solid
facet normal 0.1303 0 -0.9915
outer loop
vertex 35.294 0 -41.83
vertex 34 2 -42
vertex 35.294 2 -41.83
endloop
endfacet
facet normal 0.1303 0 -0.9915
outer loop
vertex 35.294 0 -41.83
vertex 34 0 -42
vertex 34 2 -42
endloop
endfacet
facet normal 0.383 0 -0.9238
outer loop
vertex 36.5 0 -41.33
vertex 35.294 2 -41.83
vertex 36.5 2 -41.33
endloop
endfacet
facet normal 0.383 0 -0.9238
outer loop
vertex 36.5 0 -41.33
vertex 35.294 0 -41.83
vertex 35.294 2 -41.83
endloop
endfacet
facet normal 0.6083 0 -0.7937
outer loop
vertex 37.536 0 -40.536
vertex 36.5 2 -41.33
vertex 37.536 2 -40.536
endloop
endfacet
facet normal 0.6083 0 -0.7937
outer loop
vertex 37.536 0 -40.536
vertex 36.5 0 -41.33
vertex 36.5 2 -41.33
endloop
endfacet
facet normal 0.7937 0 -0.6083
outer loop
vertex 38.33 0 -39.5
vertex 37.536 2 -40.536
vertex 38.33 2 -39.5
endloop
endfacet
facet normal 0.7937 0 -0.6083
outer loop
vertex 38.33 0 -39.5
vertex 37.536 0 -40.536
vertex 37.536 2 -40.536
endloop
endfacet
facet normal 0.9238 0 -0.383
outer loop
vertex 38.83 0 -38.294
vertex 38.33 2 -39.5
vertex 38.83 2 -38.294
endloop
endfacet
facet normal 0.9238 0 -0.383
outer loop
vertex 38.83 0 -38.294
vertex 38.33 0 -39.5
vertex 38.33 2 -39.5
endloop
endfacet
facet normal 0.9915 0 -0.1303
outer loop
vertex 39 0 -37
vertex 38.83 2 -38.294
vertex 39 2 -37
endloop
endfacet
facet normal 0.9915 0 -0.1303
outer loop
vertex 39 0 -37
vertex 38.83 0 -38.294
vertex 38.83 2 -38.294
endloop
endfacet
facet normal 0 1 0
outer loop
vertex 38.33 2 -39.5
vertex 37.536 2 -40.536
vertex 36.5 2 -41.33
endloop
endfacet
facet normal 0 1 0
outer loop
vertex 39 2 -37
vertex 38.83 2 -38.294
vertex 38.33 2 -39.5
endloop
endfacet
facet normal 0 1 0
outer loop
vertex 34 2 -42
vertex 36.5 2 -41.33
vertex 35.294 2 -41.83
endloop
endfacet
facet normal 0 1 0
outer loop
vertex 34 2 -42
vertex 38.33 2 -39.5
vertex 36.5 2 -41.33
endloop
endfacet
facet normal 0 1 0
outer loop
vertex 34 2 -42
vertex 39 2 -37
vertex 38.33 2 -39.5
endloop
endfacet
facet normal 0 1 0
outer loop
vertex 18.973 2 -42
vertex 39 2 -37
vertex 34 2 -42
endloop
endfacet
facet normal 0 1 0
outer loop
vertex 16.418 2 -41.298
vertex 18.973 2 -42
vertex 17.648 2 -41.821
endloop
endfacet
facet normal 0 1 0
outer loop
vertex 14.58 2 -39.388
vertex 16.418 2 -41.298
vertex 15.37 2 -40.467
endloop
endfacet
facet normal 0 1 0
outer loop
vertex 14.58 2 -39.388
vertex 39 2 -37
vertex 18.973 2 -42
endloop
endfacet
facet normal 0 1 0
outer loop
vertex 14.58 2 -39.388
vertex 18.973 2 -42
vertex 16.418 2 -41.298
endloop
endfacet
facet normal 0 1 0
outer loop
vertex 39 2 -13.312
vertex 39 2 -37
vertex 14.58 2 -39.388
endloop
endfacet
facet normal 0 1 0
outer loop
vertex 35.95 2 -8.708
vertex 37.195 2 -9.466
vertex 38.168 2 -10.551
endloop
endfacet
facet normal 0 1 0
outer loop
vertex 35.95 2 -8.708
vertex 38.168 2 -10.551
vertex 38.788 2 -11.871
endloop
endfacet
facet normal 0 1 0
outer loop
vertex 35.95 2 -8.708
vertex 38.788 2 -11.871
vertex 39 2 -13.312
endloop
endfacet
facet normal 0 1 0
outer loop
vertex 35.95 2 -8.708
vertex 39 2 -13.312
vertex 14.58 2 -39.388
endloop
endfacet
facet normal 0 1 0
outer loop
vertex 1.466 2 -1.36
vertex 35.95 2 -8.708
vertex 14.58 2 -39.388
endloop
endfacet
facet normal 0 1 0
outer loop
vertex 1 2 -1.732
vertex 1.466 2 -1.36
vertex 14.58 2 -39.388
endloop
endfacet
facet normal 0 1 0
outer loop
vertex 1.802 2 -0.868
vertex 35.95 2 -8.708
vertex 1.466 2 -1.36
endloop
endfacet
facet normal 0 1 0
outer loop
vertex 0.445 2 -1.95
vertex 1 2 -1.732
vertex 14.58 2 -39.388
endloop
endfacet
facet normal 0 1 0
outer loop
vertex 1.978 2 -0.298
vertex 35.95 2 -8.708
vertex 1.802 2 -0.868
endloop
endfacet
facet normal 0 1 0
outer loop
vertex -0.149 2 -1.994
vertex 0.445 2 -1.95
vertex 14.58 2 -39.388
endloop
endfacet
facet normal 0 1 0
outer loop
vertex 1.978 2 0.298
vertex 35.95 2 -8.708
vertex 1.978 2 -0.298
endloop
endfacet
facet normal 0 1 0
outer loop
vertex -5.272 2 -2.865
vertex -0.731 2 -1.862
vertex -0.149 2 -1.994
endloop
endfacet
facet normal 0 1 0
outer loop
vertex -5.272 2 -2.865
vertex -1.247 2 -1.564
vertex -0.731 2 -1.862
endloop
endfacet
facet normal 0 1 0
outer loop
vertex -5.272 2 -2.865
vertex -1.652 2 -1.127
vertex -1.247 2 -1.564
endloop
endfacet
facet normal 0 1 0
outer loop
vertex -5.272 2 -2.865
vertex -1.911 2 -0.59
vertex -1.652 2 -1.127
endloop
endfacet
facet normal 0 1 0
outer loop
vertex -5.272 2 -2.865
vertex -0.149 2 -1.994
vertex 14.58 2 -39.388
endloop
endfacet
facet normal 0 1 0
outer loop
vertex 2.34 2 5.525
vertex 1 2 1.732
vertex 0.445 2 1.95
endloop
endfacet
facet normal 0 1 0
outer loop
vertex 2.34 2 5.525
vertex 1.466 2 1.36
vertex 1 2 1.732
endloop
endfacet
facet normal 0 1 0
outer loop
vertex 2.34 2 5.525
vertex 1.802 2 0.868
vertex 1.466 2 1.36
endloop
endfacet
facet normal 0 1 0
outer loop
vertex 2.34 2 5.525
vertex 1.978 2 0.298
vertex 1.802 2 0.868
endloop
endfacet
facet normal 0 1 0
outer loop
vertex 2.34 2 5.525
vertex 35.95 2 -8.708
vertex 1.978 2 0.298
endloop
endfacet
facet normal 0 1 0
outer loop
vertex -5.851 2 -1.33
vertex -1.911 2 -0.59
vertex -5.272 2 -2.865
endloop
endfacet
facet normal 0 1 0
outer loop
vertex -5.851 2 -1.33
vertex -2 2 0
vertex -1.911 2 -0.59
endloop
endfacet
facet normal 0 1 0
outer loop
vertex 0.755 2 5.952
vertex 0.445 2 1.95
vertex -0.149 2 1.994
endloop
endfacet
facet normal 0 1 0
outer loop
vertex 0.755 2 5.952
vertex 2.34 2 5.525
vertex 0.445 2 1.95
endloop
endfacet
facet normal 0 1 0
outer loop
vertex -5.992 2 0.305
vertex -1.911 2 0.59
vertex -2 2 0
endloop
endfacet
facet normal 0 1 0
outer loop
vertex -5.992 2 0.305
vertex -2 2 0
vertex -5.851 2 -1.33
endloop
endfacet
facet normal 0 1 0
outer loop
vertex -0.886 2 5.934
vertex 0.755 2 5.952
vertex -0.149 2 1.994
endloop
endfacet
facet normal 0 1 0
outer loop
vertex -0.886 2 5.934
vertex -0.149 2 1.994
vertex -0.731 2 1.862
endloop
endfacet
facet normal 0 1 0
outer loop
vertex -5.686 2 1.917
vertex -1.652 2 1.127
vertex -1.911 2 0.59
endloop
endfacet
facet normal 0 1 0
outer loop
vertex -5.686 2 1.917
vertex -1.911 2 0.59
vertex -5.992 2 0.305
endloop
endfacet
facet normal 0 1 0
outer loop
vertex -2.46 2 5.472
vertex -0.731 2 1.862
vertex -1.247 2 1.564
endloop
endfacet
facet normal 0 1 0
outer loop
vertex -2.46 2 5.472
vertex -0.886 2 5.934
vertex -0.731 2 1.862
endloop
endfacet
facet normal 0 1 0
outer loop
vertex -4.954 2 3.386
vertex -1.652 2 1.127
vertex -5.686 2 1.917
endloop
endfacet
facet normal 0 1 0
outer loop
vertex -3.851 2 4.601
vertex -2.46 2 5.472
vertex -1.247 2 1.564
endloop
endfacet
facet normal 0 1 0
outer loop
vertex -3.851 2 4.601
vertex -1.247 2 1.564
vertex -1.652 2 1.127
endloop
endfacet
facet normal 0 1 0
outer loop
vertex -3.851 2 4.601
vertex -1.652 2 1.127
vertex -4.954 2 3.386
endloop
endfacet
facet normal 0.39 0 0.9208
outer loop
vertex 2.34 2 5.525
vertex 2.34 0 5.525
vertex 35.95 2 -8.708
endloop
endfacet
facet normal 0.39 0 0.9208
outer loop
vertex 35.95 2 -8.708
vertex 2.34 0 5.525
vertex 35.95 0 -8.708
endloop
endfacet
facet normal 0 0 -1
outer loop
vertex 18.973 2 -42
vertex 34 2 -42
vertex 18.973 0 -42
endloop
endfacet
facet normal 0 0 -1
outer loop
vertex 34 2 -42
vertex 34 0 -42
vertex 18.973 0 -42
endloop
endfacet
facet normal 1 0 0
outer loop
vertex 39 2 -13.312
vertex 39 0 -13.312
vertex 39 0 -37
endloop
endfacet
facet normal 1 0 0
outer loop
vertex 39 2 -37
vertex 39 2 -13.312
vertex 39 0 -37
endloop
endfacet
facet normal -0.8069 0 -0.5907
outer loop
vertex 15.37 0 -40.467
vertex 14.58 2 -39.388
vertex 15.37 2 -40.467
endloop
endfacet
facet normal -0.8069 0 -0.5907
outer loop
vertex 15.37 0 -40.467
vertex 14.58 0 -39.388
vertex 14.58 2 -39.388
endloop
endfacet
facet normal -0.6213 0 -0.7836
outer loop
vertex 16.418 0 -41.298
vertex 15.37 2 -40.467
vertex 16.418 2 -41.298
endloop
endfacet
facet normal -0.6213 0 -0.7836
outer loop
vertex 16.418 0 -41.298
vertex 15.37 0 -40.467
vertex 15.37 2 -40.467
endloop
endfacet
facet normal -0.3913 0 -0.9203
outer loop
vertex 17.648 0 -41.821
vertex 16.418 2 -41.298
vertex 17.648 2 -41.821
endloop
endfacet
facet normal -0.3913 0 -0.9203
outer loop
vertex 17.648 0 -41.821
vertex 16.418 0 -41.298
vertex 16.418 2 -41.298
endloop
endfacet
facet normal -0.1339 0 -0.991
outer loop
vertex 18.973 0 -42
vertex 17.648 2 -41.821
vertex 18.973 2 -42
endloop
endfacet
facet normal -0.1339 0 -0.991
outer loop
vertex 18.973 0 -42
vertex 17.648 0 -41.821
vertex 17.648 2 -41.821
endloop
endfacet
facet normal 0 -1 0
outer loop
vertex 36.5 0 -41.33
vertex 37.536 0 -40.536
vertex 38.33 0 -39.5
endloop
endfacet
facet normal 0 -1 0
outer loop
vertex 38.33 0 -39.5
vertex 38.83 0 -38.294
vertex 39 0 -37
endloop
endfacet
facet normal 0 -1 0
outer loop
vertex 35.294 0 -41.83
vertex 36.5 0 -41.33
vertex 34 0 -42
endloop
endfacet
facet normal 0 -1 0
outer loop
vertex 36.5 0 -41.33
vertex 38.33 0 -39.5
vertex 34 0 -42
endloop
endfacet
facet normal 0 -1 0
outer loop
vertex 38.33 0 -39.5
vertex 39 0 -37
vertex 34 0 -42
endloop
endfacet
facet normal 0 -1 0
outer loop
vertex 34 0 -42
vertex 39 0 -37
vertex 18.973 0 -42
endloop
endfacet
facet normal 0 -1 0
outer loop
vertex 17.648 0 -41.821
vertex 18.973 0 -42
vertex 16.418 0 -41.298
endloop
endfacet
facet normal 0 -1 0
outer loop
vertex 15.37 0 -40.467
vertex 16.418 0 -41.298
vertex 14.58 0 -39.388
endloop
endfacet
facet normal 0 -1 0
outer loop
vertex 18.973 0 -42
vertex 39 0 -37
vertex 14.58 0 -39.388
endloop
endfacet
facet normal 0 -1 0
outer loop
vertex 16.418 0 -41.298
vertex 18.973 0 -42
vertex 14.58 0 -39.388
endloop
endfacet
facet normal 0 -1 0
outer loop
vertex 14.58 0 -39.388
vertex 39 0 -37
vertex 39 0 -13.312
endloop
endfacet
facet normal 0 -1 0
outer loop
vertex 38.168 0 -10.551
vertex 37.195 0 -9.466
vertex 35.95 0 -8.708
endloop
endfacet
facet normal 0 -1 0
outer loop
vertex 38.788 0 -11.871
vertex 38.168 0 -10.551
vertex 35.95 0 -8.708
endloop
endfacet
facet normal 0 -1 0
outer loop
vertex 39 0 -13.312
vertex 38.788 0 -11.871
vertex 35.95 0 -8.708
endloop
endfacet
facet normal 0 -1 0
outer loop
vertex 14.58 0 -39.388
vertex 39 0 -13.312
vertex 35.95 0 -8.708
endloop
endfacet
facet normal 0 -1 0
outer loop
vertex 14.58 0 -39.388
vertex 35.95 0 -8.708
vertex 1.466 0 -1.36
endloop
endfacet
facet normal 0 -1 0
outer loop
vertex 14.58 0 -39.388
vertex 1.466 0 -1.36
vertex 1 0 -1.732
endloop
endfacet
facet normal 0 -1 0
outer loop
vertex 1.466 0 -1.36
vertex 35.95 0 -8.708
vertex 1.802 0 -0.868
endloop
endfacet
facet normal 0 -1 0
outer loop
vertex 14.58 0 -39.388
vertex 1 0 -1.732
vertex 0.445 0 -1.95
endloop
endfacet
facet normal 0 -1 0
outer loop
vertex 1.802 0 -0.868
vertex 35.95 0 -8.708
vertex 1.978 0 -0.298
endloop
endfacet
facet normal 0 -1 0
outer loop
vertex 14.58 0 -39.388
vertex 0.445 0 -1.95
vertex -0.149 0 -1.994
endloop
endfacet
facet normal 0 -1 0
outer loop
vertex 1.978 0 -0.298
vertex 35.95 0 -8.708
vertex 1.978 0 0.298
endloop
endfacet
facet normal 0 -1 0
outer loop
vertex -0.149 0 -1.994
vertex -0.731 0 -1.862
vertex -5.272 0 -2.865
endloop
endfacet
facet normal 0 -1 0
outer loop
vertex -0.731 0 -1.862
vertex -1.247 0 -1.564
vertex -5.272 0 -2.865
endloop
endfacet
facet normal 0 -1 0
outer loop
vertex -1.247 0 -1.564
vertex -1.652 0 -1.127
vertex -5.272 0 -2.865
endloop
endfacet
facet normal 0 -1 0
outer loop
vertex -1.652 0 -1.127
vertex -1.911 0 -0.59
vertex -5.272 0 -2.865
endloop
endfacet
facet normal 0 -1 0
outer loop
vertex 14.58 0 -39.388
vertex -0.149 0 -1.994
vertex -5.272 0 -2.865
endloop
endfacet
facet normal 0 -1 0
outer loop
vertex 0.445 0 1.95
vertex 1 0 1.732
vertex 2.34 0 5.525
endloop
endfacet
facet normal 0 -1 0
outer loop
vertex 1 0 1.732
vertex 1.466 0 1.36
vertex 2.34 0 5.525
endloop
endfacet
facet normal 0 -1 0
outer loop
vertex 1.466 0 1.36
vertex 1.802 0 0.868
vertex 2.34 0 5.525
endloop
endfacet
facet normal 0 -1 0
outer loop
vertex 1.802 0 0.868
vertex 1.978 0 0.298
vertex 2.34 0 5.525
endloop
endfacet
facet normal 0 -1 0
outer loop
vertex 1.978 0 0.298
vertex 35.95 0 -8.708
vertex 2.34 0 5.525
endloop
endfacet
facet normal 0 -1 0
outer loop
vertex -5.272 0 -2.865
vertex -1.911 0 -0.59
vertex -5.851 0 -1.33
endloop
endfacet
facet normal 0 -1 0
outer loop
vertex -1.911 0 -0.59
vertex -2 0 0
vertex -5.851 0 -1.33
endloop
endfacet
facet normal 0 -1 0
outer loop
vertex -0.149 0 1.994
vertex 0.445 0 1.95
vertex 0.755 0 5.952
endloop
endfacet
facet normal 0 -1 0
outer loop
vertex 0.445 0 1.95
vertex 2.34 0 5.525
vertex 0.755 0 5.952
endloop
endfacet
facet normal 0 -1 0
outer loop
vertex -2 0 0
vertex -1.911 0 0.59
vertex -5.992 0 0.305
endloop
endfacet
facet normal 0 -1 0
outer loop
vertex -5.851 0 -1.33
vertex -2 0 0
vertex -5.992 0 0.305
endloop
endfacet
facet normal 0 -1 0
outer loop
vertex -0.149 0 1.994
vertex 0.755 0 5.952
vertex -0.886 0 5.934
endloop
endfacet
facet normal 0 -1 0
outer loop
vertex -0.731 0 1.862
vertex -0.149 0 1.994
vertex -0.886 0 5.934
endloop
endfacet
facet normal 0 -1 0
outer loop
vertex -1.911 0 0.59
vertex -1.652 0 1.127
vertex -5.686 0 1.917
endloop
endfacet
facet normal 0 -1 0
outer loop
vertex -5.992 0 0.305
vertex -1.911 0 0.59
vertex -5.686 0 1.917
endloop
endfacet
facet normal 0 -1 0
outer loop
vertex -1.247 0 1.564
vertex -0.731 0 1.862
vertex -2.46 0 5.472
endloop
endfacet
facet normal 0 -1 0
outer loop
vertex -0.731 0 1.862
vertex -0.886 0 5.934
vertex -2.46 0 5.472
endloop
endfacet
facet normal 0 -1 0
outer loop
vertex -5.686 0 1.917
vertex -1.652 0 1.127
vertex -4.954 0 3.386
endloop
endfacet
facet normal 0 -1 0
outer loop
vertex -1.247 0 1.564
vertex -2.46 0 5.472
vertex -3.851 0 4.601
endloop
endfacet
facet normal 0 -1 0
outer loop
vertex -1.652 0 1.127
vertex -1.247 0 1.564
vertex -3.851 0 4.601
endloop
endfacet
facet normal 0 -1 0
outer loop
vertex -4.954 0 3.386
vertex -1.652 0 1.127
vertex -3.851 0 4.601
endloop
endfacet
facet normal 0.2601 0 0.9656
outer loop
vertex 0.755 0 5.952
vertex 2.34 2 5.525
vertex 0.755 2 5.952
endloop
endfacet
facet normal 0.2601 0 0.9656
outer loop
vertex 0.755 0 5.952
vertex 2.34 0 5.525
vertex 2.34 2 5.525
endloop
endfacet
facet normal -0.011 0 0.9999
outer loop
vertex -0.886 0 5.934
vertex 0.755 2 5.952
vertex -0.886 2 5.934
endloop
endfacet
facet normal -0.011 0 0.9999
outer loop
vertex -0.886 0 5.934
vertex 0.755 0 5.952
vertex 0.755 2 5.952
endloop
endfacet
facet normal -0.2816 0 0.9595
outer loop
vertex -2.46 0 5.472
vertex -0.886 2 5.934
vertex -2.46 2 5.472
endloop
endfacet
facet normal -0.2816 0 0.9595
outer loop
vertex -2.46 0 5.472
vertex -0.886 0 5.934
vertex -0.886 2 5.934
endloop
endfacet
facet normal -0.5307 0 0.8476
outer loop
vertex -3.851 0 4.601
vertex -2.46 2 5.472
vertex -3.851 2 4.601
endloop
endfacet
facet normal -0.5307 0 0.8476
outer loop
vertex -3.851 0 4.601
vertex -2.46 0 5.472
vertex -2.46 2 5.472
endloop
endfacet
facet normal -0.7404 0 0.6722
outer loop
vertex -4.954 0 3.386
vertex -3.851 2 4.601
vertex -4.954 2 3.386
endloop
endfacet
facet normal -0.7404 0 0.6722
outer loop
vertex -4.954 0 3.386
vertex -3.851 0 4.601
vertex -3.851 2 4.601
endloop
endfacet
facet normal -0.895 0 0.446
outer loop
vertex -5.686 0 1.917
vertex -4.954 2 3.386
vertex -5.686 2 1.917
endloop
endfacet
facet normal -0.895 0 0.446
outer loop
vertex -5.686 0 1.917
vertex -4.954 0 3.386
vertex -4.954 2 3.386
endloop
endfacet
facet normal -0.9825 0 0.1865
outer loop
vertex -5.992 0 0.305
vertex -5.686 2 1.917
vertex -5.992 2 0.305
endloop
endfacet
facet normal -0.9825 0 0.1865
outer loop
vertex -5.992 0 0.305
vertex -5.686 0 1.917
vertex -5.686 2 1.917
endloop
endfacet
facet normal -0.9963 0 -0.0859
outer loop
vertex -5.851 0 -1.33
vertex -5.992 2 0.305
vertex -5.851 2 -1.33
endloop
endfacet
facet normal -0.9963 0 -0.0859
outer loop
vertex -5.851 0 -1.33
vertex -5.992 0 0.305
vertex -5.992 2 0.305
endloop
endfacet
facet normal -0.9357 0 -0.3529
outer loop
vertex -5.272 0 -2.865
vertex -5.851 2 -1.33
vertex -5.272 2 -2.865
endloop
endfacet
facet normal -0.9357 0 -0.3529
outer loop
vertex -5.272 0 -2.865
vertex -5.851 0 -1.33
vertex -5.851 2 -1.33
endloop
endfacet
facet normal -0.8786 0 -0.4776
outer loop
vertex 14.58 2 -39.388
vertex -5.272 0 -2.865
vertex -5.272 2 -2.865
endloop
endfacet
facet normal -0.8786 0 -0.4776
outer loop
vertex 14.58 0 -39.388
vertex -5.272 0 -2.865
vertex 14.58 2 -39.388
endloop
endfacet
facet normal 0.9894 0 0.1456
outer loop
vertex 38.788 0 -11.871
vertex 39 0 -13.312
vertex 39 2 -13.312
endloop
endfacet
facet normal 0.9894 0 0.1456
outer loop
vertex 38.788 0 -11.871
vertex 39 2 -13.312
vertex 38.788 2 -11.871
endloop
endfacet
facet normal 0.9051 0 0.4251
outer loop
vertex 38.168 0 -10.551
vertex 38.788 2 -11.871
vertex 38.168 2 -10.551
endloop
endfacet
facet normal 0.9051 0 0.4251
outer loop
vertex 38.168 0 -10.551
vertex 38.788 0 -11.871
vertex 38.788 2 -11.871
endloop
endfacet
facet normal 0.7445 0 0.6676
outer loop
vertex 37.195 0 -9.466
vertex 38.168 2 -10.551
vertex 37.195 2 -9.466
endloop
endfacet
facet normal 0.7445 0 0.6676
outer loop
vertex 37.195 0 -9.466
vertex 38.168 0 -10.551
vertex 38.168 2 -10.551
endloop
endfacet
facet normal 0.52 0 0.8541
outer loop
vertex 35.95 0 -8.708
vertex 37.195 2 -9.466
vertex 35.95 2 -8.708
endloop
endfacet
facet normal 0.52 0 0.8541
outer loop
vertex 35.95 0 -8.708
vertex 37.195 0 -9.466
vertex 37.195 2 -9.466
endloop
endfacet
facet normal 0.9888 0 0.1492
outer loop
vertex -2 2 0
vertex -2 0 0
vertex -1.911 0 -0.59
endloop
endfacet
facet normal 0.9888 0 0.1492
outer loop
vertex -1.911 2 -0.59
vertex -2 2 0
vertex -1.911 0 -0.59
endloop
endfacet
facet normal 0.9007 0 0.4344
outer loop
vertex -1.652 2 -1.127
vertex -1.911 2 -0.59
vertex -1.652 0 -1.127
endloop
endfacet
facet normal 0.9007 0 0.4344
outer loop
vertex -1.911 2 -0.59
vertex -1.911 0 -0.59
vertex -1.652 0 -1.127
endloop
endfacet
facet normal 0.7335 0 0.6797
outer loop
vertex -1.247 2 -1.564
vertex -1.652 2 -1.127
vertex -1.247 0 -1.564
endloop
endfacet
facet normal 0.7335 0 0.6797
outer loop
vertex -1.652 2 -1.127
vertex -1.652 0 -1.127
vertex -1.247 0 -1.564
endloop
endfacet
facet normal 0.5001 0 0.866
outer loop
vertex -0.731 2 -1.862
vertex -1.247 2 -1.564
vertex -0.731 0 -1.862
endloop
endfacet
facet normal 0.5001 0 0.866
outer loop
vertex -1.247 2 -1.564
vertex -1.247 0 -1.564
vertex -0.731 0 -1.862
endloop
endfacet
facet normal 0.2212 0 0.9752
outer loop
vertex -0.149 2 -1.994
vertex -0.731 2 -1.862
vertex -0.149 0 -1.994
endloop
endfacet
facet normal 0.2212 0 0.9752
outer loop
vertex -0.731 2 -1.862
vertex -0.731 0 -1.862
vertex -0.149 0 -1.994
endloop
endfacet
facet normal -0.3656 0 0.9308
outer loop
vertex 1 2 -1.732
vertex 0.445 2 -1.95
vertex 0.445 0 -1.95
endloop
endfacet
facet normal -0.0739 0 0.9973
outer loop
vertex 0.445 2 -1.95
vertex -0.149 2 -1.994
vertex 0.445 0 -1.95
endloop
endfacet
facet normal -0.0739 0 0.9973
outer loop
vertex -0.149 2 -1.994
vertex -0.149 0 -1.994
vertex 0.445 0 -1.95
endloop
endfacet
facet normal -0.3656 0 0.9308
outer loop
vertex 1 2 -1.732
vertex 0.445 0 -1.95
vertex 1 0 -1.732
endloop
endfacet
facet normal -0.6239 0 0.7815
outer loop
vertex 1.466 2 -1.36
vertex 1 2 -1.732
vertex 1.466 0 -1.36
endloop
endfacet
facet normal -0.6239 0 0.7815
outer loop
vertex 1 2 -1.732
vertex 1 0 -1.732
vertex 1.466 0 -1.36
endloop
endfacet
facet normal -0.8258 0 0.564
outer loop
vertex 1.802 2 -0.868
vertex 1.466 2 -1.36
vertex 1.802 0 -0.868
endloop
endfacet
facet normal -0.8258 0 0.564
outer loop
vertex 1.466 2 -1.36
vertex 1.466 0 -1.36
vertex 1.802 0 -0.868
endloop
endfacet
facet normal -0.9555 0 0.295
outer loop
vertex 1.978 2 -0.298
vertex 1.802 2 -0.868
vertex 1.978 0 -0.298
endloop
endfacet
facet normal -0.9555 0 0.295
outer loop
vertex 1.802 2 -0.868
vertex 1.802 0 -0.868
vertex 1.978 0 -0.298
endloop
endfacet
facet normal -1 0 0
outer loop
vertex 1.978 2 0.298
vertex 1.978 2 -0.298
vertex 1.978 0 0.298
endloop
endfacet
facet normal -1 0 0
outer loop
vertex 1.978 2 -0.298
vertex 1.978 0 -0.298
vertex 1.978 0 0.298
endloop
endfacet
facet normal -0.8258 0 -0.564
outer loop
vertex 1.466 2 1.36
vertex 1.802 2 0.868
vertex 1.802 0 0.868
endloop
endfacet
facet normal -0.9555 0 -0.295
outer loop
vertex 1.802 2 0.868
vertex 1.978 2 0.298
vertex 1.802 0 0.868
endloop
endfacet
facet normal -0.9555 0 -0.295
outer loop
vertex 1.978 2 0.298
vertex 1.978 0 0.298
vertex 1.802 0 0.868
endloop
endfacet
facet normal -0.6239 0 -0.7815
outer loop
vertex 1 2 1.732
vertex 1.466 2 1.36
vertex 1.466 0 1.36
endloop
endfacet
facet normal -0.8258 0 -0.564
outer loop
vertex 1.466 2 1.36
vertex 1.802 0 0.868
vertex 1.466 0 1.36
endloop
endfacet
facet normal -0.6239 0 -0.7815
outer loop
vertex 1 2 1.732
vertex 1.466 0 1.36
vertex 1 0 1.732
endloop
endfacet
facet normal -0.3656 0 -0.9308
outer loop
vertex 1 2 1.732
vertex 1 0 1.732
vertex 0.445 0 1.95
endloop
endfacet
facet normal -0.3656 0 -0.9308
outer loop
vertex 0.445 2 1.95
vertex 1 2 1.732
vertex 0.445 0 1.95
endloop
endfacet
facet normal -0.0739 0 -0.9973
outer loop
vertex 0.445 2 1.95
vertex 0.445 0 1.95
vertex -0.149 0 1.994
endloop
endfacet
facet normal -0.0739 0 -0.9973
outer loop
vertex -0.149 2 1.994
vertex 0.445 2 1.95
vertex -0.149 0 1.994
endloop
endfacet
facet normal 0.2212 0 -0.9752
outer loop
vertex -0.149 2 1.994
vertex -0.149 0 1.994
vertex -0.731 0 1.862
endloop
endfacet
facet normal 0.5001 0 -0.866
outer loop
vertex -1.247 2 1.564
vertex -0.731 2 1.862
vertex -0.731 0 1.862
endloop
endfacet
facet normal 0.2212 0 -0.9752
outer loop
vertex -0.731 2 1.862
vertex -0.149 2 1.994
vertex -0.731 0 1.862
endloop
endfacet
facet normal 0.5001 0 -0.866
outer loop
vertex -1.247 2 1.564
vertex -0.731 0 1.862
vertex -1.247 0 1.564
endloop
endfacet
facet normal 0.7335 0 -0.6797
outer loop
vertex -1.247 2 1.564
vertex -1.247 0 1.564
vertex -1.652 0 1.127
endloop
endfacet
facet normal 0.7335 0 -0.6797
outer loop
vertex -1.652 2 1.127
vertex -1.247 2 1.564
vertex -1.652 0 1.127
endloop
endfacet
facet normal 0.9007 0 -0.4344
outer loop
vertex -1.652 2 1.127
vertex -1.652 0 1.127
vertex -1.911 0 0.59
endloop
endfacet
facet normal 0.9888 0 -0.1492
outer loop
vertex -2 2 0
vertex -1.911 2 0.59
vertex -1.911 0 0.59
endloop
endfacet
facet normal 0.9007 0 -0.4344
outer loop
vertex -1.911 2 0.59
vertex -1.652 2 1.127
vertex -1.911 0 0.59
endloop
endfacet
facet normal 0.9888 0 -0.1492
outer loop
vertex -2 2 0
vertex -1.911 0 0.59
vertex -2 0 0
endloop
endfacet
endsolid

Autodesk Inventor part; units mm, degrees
ref_plane "YZ Plane" through (0, 0, 0) normal (1, 0, 0) x (0, 1, 0)
ref_plane "XZ Plane" through (0, 0, 0) normal (0, 1, 0) x (-1, 0, 0)
ref_plane "XY Plane" through (0, 0, 0) normal (0, 0, 1) x (1, 0, 0)
sketch "Sketch1" plane through (0, 0, 0) normal (0, 1, 0) x (-1, 0, 0)
  circle A0 centre (0, 0) radius 12 construction
  line L0 (0, 0) -> (0, -50) construction
  line L1 (-20, -16) -> (-34, -16) construction
  line L2 (-34, -16) -> (-34, -50) construction
  line L3 (-34, -50) -> (-20, -50) construction
  line L4 (-20, -50) -> (-20, -16) construction
  circle A1 centre (0, 0) radius 2
  arc A2 (5.2716, -2.8654) -> (-2.3397, 5.525) centre (0, 0) ccw
  line L5 (-34, -42) -> (-18.9731, -42)
  line L6 (5.2716, -2.8654) -> (-14.5801, -39.3878)
  line L7 (-2.3397, 5.525) -> (-35.9498, -8.7083)
  line L8 (-39, -13.3125) -> (-39, -37)
  arc A3 (-18.9731, -42) -> (-14.5801, -39.3878) centre (-18.9731, -37) ccw
  arc A4 (-39, -37) -> (-34, -42) centre (-34, -37) ccw
  arc A5 (-35.9498, -8.7083) -> (-39, -13.3125) centre (-34, -13.3125) ccw
  point P0 (-39, -42)
  point P1 (-16, -42)
  point P2 (-39, -10)
  dimension "d0" = 50
  dimension "d1" = 24
  dimension "d2" = 14
  dimension "d3" = 34
  dimension "d4" = 16
  dimension "d5" = 20
  dimension "d6" = 4
  dimension "d7" = 12
  dimension "d8" = 26
  dimension "d9" = 23
  dimension "d10" = 5
  dimension "d11" = 32
  dimension "d12" = 5
  dimension "d13" = 5
extrude "Extrusion1" add sketch "Sketch1" along normal blind 2
properties part number "flange_large"
